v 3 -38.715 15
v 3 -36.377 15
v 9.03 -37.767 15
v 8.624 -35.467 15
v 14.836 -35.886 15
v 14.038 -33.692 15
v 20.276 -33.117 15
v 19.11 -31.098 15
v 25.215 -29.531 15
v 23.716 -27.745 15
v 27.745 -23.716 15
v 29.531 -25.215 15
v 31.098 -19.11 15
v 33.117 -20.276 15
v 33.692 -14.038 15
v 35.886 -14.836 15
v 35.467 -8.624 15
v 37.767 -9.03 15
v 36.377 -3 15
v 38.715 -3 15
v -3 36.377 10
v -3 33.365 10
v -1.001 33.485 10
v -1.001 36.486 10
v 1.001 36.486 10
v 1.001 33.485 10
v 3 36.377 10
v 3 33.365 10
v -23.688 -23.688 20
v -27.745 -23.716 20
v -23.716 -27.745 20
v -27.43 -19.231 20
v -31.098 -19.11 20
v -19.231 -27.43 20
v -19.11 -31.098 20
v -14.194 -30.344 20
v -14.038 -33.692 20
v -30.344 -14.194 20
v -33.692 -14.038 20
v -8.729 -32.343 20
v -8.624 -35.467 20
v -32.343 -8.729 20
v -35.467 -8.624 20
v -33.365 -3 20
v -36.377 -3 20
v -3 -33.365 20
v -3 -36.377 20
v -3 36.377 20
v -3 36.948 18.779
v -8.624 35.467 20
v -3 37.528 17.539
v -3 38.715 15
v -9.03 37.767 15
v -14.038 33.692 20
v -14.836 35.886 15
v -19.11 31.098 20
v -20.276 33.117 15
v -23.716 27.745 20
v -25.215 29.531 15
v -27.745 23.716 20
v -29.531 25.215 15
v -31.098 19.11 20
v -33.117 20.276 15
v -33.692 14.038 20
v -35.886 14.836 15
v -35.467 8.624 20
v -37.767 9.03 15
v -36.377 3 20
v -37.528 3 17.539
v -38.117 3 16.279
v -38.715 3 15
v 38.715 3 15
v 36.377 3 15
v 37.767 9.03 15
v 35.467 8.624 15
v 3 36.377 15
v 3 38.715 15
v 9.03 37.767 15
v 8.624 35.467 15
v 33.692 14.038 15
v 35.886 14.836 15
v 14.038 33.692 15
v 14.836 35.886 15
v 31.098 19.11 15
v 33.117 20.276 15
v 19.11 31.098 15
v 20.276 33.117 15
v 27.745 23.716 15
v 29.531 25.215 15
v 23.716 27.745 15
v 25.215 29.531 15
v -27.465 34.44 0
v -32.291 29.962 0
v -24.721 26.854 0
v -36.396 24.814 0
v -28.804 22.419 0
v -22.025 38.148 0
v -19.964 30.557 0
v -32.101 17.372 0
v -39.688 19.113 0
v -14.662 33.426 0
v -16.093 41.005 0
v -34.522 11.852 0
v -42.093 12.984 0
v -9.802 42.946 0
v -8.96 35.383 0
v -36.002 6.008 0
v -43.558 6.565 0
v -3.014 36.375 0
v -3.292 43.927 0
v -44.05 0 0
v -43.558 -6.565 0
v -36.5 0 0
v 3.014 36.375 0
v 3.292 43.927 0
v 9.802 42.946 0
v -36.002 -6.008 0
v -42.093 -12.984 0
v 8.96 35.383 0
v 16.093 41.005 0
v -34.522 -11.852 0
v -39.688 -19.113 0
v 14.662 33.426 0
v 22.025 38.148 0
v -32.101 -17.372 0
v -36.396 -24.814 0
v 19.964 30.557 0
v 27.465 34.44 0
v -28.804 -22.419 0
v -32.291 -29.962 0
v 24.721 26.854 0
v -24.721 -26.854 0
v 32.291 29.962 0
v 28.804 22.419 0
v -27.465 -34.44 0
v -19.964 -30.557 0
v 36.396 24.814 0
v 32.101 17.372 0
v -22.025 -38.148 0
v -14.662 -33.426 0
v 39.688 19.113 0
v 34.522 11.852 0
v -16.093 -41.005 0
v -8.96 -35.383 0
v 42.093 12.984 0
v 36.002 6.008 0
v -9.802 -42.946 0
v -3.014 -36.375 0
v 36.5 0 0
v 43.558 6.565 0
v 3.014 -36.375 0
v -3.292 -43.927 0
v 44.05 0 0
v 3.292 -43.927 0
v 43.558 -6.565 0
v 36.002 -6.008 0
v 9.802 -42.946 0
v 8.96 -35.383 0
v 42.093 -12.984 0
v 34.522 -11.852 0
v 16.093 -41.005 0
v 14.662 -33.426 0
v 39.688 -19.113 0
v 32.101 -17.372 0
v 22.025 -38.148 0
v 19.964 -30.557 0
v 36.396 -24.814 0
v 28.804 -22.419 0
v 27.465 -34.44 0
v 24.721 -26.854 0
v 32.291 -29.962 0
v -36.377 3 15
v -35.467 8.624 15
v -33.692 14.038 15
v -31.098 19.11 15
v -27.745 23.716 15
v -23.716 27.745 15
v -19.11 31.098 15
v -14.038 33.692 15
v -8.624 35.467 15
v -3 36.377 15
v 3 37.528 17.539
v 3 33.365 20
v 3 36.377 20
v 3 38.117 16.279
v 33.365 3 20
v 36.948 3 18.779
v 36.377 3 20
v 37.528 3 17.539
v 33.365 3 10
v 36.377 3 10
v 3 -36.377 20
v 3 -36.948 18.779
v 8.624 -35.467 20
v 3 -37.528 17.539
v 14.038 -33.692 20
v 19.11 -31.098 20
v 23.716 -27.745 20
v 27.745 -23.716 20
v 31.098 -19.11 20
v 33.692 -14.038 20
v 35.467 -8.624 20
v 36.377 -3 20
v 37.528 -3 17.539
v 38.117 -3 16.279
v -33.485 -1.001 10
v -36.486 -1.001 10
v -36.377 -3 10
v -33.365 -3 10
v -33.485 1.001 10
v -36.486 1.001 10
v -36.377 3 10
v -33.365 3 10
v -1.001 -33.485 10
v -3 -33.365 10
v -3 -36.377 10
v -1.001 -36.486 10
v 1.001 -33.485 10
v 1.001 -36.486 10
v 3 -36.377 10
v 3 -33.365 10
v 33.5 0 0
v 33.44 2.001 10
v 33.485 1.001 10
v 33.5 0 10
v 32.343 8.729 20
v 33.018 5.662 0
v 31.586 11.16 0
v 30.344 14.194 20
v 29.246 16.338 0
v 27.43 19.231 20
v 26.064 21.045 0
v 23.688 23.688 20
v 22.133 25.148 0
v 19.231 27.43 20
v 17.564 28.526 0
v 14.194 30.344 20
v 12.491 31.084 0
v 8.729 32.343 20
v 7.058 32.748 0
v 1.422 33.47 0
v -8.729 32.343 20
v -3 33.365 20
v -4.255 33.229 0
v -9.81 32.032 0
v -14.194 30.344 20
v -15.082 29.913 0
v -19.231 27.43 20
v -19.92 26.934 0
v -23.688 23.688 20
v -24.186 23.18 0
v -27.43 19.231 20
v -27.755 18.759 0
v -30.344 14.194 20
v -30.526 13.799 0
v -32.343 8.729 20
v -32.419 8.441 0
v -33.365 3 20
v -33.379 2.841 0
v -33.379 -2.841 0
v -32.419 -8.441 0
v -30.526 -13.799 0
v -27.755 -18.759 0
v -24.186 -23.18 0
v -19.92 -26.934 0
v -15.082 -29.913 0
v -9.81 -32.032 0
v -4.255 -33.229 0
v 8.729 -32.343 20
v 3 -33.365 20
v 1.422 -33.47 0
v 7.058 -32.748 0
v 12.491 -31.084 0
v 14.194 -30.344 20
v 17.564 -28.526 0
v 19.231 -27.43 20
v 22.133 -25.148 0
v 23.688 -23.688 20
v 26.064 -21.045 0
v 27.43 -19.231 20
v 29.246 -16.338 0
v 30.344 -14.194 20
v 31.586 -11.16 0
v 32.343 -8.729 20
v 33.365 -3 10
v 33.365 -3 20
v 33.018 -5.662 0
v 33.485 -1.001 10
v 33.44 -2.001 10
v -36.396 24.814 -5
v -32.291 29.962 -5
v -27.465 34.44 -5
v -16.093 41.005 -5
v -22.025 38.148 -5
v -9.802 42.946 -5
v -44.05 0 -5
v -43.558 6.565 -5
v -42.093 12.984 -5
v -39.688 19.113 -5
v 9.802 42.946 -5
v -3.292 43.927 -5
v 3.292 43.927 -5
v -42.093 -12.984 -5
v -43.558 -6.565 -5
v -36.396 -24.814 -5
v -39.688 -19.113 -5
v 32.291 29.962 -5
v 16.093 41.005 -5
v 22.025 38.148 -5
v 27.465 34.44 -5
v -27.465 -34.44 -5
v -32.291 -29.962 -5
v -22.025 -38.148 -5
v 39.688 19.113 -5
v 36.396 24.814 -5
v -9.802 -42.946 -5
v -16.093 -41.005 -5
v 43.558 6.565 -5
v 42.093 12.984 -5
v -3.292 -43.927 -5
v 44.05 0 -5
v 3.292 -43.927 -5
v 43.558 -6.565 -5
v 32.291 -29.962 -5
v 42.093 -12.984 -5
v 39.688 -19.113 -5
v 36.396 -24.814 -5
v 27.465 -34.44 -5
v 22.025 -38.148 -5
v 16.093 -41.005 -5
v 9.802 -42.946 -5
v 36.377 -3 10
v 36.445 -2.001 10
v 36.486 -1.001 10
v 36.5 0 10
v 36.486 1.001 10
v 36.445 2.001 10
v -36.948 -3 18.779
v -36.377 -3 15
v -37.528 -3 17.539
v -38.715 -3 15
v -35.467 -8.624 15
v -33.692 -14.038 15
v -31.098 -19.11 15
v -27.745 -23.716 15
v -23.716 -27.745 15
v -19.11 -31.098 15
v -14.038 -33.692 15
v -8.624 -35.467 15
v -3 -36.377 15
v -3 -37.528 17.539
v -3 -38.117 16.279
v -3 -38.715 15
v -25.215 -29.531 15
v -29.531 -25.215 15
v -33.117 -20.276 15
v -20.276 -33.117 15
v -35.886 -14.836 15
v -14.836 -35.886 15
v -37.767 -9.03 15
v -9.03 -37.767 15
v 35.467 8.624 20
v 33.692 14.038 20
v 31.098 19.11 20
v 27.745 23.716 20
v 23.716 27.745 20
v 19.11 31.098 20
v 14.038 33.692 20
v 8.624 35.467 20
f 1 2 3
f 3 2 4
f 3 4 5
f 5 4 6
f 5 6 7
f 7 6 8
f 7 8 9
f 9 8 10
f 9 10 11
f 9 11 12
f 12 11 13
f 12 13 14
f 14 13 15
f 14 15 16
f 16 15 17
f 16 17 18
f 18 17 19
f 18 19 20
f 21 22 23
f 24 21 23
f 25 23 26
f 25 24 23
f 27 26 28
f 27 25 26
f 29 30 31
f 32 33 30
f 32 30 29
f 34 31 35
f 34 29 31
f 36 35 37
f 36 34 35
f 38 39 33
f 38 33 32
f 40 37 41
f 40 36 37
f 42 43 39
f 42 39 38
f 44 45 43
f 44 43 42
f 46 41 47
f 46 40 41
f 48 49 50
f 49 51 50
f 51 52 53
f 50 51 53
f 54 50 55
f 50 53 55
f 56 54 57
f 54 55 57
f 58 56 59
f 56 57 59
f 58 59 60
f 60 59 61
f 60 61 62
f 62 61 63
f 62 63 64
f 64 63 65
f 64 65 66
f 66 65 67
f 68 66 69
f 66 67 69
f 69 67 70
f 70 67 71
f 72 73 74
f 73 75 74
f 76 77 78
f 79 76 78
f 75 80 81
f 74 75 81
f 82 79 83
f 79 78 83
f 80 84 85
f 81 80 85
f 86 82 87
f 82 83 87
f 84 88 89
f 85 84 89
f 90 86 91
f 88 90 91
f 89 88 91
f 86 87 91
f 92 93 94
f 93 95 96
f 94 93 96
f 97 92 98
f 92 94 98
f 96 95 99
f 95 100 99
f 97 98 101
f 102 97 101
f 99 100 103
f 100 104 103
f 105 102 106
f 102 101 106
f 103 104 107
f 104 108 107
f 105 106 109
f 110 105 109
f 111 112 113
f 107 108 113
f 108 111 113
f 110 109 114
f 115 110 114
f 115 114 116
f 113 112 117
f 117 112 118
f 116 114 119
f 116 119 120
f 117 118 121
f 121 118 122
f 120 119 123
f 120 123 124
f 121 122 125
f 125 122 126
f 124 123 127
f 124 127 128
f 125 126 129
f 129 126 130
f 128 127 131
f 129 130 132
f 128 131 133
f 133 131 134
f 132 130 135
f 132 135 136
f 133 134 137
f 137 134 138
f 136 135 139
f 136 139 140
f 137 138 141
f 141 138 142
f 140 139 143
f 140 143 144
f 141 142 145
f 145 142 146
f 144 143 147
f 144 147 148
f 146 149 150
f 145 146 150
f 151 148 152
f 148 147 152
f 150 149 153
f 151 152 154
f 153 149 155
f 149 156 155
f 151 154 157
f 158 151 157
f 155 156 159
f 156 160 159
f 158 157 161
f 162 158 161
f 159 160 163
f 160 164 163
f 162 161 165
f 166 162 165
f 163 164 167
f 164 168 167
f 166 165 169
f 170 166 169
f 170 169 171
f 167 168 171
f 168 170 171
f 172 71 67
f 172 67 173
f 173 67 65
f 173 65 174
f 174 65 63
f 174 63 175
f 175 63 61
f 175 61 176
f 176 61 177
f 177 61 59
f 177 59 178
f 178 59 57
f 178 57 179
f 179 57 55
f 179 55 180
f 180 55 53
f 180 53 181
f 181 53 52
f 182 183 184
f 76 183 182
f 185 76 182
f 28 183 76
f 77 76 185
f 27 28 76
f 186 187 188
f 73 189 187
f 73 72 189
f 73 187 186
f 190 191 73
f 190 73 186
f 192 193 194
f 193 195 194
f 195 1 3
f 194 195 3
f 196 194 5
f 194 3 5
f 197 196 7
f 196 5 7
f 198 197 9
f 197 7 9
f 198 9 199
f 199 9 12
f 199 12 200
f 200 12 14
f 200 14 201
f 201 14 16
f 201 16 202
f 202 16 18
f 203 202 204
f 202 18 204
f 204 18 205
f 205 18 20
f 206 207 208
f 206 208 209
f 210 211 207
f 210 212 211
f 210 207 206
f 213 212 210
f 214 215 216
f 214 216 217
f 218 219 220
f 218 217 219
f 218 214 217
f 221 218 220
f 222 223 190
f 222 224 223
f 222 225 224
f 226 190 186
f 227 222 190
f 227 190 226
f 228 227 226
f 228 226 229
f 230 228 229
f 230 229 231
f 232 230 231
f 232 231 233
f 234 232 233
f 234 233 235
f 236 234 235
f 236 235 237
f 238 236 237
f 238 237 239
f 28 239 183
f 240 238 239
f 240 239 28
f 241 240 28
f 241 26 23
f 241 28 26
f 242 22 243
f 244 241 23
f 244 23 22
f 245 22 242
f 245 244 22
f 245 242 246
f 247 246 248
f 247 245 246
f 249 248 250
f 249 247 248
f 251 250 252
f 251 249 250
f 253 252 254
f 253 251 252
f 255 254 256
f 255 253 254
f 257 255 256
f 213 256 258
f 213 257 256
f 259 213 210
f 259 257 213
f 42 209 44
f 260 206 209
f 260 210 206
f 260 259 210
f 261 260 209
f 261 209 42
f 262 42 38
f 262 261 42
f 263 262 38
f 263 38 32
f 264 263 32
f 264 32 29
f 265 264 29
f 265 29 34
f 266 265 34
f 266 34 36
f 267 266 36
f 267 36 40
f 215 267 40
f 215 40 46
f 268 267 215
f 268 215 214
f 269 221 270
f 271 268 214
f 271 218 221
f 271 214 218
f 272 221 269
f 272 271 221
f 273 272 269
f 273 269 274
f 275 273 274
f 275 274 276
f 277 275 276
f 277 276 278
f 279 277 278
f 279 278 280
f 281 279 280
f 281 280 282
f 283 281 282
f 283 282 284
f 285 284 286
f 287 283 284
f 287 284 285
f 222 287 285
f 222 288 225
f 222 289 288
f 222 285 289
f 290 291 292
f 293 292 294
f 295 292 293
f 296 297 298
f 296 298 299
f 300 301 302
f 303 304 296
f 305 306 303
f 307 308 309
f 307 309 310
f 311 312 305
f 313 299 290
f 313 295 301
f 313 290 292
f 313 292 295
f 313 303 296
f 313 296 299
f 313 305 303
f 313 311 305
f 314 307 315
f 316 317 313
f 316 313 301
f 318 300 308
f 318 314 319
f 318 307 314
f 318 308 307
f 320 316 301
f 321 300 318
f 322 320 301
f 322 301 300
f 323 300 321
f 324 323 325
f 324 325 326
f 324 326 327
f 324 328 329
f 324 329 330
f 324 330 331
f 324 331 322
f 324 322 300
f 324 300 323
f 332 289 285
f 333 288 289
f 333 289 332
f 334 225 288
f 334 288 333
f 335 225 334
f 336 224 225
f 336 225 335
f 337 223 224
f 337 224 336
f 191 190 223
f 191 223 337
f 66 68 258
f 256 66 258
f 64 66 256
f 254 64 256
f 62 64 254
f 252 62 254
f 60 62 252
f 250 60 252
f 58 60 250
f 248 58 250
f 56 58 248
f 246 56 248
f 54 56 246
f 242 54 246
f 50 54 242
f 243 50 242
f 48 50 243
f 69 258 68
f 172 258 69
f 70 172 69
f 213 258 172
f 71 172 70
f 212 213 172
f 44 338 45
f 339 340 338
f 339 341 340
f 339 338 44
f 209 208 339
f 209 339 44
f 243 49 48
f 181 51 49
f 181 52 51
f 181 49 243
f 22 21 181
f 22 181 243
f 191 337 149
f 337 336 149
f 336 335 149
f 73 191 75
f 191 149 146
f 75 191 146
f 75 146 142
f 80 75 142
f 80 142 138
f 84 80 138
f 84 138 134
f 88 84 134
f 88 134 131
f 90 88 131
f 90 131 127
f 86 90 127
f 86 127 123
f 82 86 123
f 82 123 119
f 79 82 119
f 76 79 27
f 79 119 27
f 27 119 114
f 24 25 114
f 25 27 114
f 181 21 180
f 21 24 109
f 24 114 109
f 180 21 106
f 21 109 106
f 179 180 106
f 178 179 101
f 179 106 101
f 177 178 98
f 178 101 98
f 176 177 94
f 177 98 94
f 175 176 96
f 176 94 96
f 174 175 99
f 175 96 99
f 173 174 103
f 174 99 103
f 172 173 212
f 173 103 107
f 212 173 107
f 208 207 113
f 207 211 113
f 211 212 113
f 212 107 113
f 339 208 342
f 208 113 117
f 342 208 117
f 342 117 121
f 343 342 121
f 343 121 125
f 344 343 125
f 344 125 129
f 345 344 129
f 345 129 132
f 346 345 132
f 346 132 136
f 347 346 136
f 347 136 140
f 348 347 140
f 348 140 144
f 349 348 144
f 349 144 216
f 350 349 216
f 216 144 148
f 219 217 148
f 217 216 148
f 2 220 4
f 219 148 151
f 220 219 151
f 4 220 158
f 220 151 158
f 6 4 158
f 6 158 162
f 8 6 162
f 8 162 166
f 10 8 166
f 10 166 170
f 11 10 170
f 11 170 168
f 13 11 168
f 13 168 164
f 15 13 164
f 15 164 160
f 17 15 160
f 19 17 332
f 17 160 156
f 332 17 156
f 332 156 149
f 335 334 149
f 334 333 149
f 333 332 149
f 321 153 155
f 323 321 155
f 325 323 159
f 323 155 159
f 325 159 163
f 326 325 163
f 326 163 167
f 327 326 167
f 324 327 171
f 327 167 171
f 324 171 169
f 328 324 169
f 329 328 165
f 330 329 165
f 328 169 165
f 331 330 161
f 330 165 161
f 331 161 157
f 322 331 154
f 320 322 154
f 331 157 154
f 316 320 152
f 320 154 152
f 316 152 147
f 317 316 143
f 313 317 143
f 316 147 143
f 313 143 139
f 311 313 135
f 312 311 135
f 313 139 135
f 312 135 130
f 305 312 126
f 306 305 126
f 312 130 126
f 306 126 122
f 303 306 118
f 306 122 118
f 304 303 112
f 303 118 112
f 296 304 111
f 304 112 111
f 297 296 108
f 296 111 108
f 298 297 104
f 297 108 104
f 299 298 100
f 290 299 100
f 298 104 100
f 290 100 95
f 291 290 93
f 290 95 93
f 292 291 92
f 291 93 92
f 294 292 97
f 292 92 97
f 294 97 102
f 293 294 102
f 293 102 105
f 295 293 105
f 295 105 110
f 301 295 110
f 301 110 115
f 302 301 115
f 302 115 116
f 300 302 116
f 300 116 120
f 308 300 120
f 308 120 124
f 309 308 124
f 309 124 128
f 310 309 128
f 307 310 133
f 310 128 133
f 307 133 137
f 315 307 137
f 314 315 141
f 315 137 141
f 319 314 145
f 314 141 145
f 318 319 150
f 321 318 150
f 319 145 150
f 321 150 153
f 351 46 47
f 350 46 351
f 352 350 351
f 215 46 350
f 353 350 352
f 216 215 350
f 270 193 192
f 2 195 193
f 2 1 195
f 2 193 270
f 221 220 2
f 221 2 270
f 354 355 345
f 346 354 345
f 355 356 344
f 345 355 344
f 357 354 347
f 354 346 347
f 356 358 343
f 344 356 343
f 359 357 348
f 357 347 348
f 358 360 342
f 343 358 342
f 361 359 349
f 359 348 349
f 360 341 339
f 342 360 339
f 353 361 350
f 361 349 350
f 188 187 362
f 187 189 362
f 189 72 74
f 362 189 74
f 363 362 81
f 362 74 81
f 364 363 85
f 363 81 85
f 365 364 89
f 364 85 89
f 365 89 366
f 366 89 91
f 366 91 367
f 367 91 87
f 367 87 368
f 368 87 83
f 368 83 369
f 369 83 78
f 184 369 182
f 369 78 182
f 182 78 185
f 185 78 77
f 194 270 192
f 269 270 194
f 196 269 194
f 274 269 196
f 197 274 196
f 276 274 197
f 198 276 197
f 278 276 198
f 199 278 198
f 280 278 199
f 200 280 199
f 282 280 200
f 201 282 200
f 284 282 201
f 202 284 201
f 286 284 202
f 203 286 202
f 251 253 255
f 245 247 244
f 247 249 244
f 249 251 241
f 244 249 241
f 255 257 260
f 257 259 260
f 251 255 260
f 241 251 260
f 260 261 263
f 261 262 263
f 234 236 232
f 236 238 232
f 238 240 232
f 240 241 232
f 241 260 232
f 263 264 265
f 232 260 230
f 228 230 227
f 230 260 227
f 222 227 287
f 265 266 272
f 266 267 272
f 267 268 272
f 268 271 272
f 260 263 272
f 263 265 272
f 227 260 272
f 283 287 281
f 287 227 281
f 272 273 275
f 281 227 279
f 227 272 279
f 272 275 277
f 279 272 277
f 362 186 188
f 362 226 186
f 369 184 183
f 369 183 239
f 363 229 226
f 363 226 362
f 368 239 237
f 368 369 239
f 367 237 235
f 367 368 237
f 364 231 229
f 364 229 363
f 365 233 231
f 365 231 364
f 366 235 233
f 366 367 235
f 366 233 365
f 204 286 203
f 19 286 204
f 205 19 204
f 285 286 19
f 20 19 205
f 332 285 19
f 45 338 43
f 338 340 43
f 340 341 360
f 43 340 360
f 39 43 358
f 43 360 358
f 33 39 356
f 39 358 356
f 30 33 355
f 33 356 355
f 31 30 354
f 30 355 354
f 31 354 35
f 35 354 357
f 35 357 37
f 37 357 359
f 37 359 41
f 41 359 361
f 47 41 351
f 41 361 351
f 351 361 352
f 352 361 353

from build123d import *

# Parameters (mm, degrees)
F0_R      = 36.5
F0_R_2    = 33.5
F1_DEPTH  = 20
F2_R      = 36.5
F3_DEPTH  = 5
F3_TAPER  = -25
F4_R      = 33.5
F5_DEPTH  = 25
F6_R      = 44.05
F7_DEPTH  = 5
F10_DEPTH = 25


with BuildPart() as f1:
    # F0 (on Top) → F1 (new body)
    with BuildSketch(Plane.XY):
        Circle(F0_R)
        Circle(F0_R_2, mode=Mode.SUBTRACT)
    extrude(amount=F1_DEPTH)

    # F2 (on face) → F3 (join)
    with BuildSketch(Plane.XY.offset(20)):
        Circle(F2_R)
    extrude(amount=-F3_DEPTH, taper=F3_TAPER)

    # F4 (on face) → F5 (cut)
    with BuildSketch(Plane(origin=(0, 0, 15), x_dir=(1, 0, 0), z_dir=(0, 0, -1))):
        Circle(F4_R)
    extrude(amount=-F5_DEPTH, mode=Mode.SUBTRACT)

    # F6 (on face) → F7 (join)
    with BuildSketch(Plane(origin=(0, 0, 0), x_dir=(1, 0, 0), z_dir=(0, 0, -1))):
        Circle(F6_R)
    extrude(amount=F7_DEPTH)

    # F9 (on mid) → F10 (cut)
    with BuildSketch(Plane.XY.offset(10)):
        with BuildLine():
            Line((35.05, 3), (3, 3))
            Line((3, 3), (3, 35.05))
            Line((3, 35.05), (3, 38.3829389182))
            ThreePointArc((3, 38.3829389182), (0, 38.5), (-3, 38.3829389182))
            Line((-3, 38.3829389182), (-3, 35.05))
            Line((-3, 35.05), (-3, 3))
            Line((-3, 3), (-38.3829389182, 3))
            Line((-38.3829389182, 3), (-61.3953992724, 3))
            Line((-61.3953992724, 3), (-61.3953992724, -3))
            Line((-61.3953992724, -3), (-3, -3))
            Line((-3, -3), (-3, -40.2699470416))
            Line((-3, -40.2699470416), (-3, -53.7798181176))
            Line((-3, -53.7798181176), (3, -53.7798181176))
            Line((3, -53.7798181176), (3, -40.2699470416))
            Line((3, -40.2699470416), (3, -29.05))
            Line((3, -29.05), (3, -3))
            Line((3, -3), (61.3953992724, -3))
            Line((61.3953992724, -3), (61.3953992724, 3))
            Line((61.3953992724, 3), (38.3829389182, 3))
            Line((38.3829389182, 3), (35.05, 3))
        make_face()
        with BuildLine():
            ThreePointArc((-3, 38.3829389182), (0, 38.5), (3, 38.3829389182))
            Line((3, 38.3829389182), (3, 40.2699470416))
            Line((3, 40.2699470416), (3, 53.7798181176))
            Line((3, 53.7798181176), (-3, 53.7798181176))
            Line((-3, 53.7798181176), (-3, 40.2699470416))
            Line((-3, 40.2699470416), (-3, 38.3829389182))
        make_face()
    extrude(amount=F10_DEPTH, mode=Mode.SUBTRACT)


solid = f1.part
